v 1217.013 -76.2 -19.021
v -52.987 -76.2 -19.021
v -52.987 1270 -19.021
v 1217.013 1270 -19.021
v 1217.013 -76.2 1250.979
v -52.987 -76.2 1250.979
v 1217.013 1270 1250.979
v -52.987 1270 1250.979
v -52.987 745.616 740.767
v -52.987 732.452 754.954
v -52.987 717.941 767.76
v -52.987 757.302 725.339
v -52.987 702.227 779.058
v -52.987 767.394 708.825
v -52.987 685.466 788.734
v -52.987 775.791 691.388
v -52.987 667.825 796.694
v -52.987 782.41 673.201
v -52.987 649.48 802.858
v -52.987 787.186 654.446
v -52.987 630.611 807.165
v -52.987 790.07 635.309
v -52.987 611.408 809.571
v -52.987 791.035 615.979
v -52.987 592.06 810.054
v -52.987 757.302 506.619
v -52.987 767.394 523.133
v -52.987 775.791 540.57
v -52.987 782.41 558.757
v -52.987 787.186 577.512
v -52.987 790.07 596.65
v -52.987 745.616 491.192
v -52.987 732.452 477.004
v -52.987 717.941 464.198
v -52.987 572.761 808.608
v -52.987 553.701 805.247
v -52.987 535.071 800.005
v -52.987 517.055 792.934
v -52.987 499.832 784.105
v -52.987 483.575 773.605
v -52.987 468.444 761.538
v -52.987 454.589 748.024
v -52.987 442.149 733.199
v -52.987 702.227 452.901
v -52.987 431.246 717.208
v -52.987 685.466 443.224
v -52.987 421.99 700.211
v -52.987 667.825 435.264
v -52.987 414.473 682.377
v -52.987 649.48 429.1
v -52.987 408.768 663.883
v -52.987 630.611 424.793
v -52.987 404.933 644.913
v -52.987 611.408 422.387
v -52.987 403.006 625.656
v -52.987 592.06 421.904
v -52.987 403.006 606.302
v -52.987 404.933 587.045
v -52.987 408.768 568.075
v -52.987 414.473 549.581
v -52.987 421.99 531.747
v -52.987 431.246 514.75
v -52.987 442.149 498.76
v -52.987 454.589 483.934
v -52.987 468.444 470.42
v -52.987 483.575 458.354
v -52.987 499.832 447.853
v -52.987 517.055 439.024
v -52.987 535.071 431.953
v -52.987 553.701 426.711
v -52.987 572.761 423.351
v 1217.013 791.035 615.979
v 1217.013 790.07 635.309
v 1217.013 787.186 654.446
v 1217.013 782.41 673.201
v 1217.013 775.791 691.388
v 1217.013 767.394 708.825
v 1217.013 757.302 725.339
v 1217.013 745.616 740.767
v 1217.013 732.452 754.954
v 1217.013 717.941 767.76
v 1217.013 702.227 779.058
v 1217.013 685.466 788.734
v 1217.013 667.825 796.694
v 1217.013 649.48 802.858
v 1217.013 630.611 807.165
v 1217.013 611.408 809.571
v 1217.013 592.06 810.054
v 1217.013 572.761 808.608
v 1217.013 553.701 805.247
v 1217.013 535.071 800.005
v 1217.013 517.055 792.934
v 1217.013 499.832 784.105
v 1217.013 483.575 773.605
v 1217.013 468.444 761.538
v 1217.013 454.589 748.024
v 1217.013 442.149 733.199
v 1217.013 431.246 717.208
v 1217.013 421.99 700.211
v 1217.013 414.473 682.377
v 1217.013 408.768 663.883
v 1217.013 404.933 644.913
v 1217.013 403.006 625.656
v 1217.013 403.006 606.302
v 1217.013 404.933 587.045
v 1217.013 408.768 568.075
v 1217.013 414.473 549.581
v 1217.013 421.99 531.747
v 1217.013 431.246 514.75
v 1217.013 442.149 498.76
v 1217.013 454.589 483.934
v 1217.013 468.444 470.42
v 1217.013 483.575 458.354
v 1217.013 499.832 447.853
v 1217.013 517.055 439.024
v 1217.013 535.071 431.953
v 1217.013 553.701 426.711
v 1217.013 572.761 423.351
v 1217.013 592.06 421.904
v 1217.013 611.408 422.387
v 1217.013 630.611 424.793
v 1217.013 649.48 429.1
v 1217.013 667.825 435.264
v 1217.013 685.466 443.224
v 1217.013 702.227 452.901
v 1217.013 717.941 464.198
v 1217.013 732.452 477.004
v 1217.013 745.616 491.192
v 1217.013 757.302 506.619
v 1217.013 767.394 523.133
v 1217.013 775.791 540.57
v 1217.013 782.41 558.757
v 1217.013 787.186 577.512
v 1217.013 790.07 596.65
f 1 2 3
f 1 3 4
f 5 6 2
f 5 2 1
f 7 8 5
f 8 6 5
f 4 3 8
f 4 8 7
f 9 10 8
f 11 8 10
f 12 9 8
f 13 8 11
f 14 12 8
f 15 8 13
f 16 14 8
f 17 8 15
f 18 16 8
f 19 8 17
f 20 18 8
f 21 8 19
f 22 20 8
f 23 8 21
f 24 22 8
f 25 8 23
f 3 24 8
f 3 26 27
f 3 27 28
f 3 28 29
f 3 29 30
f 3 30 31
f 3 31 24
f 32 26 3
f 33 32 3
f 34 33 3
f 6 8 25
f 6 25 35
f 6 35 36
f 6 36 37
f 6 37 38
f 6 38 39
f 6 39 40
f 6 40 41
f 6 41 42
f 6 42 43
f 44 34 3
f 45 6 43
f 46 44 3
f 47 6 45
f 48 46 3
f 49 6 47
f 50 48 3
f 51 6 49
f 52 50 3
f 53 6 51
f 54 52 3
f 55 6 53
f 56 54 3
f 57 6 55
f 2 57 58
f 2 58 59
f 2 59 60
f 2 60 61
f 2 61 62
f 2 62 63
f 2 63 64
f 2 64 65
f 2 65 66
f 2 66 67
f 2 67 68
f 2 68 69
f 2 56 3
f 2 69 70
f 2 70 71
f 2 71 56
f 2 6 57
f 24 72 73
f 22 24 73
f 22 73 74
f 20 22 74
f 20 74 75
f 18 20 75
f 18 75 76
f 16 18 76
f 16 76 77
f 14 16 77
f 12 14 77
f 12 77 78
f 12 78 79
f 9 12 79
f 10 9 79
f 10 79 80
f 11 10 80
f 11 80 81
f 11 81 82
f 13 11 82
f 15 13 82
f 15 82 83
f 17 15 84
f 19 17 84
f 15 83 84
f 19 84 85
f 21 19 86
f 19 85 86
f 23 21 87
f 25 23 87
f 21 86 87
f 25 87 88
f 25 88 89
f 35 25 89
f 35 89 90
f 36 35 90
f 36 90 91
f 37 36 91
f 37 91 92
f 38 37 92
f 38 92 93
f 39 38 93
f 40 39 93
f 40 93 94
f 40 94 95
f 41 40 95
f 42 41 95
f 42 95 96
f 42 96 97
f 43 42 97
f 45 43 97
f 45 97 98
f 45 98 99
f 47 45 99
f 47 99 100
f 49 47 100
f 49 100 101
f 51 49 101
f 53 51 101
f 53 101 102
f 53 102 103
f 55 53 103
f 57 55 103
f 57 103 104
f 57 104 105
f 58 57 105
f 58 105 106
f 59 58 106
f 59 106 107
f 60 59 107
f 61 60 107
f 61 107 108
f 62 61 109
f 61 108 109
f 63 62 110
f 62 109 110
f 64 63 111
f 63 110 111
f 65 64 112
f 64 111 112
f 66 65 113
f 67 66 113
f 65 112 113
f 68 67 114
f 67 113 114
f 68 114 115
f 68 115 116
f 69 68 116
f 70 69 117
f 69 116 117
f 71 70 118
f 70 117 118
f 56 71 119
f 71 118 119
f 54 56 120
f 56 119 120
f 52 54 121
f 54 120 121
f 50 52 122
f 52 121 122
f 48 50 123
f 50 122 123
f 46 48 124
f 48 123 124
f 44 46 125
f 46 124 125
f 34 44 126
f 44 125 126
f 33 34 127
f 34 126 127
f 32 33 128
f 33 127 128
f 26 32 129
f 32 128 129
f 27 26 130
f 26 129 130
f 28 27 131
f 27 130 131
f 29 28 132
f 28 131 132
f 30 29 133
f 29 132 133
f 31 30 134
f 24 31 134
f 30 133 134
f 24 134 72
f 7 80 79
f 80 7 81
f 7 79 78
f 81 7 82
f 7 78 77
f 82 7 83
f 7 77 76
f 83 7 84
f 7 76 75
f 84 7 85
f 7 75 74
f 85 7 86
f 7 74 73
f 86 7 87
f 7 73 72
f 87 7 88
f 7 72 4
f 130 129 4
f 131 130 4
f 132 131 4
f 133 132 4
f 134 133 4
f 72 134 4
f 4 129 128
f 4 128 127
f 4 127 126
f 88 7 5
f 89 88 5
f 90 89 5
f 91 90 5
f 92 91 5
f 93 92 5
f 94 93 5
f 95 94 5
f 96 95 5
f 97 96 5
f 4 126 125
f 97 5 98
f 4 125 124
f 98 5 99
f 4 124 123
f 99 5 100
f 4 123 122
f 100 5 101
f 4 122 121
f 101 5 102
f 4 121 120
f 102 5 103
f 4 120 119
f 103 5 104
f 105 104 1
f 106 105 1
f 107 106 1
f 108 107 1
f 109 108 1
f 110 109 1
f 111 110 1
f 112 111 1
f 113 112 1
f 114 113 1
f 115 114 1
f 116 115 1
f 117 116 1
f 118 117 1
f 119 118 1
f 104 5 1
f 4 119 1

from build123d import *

# Parameters (mm, degrees)
F0_W      = 1270
F0_H      = 1270
F1_DEPTH  = 76.2
F1_FACE_W = 1270
F1_FACE_H = 1270
F2_DEPTH  = 1270
F3_R      = 194.135033
F4_DEPTH  = 40.64
F4_FACE_R = 194.135033
F5_DEPTH  = 1397


with BuildPart() as f1:
    # F0 (on Front) → F1 (new body)
    with BuildSketch(Plane.XZ):
        with Locations((582.012902, 615.979133)):
            Rectangle(F0_W, F0_H)
    extrude(amount=F1_DEPTH)

    # F1_face (on face) → F2 (join)
    with BuildSketch(Plane(origin=(582.012902, 0, 615.979133), x_dir=(1, 0, 0), z_dir=(0, 1, 0))):
        Rectangle(F1_FACE_W, F1_FACE_H)
    extrude(amount=F2_DEPTH)

    # F3 (on face) → F4 (join)
    with BuildSketch(Plane.YZ.offset(1217.012902)):
        with Locations((596.9, 615.979133)):
            Circle(F3_R)
    extrude(amount=F4_DEPTH)

    # F4_face (on face) → F5 (cut)
    with BuildSketch(Plane(origin=(1257.652902, 596.9, 615.979133), x_dir=(0, 1, 0), z_dir=(1, 0, 0))):
        Circle(F4_FACE_R)
    extrude(amount=-F5_DEPTH, mode=Mode.SUBTRACT)


solid = f1.part
